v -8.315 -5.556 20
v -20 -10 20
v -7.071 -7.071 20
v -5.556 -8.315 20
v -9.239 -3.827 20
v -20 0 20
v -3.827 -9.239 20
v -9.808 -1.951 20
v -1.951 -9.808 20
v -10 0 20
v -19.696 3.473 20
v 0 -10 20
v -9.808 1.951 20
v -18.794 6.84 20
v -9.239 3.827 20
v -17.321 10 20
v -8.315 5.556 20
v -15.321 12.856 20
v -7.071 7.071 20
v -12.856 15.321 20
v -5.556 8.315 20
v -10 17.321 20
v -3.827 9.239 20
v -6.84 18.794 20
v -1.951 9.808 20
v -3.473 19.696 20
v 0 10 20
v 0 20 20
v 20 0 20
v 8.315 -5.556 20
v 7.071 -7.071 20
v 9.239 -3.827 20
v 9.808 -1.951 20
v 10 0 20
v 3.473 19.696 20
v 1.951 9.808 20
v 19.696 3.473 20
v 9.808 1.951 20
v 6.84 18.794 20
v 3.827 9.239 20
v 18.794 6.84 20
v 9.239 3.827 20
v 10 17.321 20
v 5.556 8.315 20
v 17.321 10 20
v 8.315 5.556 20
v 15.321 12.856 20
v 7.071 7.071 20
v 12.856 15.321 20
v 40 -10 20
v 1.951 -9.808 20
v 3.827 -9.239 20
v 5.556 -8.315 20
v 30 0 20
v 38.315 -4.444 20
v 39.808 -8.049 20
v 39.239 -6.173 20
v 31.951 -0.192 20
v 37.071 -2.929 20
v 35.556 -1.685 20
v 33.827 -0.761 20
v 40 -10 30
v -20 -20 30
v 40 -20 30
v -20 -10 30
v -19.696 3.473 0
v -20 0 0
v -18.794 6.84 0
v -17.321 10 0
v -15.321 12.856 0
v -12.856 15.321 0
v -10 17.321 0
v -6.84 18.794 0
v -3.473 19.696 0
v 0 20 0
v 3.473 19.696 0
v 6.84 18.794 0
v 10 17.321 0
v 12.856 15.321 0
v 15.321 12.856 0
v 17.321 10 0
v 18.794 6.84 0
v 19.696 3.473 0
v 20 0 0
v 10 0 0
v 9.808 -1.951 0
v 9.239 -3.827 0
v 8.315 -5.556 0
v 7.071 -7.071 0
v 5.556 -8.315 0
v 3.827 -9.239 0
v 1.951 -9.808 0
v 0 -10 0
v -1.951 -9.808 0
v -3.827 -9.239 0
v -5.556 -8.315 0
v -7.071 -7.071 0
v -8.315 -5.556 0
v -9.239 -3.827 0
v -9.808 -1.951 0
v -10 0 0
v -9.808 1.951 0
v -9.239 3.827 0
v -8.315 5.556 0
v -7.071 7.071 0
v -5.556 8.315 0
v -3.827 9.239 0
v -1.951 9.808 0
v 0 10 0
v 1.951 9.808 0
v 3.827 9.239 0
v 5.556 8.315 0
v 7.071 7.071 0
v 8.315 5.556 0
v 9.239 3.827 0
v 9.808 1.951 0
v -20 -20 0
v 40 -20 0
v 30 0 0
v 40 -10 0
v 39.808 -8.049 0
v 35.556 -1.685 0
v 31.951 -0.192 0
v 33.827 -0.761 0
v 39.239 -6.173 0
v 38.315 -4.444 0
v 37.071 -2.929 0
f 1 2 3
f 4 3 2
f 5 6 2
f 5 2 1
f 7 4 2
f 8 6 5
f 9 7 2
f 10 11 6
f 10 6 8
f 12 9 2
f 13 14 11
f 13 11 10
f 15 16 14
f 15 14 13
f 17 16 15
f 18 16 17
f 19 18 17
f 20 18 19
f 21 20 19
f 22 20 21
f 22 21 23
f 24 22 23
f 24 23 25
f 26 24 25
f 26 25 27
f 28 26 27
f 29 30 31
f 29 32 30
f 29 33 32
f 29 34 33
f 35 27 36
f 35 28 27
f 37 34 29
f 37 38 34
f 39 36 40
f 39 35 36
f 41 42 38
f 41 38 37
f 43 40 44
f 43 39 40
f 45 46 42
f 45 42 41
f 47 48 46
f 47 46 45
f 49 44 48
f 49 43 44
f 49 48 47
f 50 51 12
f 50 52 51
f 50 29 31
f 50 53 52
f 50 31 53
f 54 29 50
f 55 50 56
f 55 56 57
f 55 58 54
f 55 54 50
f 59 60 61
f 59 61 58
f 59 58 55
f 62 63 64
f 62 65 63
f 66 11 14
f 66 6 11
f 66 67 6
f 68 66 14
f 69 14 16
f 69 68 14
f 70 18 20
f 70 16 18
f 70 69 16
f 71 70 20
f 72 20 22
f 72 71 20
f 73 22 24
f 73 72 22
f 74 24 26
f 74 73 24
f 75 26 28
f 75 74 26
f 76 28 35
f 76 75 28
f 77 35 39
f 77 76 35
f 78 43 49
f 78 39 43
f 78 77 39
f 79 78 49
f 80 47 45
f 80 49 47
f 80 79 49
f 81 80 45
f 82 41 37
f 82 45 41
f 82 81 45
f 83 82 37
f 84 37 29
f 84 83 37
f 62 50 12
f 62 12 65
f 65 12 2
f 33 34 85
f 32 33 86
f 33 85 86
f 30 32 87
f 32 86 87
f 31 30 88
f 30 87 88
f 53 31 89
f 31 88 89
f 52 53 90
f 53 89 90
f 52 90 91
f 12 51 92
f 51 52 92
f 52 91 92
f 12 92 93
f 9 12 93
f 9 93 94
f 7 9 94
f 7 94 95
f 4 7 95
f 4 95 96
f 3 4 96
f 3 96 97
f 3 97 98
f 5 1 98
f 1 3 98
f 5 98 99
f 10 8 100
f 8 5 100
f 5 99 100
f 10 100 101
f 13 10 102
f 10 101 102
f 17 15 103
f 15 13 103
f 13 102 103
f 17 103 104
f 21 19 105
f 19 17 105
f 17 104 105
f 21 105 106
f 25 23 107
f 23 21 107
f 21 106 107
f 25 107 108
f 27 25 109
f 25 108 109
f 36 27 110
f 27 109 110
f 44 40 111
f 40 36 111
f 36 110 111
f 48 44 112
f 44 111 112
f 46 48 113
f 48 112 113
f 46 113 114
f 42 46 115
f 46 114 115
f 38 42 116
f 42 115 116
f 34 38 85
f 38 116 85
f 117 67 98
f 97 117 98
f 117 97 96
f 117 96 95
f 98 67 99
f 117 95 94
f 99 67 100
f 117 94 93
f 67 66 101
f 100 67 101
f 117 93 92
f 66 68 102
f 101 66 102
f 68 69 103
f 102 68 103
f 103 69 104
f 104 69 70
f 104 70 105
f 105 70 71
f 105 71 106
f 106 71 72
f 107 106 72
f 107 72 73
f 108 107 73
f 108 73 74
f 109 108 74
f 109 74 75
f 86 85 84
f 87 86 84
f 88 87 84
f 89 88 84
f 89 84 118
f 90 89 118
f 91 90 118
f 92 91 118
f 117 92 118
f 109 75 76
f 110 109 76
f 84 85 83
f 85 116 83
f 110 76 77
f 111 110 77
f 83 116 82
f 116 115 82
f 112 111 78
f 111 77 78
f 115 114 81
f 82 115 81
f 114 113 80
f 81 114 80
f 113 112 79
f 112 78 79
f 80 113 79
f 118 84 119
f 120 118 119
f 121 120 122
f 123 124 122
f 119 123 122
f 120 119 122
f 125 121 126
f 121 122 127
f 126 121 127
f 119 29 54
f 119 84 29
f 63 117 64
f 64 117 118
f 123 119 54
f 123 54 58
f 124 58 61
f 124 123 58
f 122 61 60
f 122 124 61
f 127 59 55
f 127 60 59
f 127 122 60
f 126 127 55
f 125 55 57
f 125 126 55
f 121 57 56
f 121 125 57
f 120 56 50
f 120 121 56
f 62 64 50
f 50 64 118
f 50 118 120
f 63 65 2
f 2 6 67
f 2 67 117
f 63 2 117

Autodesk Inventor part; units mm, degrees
ref_plane "YZ Plane" through (0, 0, 0) normal (1, 0, 0) x (0, 1, 0)
ref_plane "XZ Plane" through (0, 0, 0) normal (0, 1, 0) x (-1, 0, 0)
ref_plane "XY Plane" through (0, 0, 0) normal (0, 0, 1) x (1, 0, 0)
sketch "草圖1" plane through (0, 0, 0) normal (0, 0, 1) x (1, 0, 0)
  circle A0 centre (0, 0) radius 10
  arc A1 (20, 0) -> (-20, 0) centre (0, 0) ccw
  line L0 (-20, 0) -> (-20, -20)
  line L1 (-20, -20) -> (40, -20)
  line L2 (40, -20) -> (40, -10)
  line L3 (40, -10) -> (-20, -10)
  line L4 (-20, -10) -> (-20, -20)
  line L5 (20, 0) -> (30, 0)
  line L6 (40, -10) -> (40, -10)
  arc A2 (40, -10) -> (30, 0) centre (30, -10) ccw
  point P0 (40, 0)
  point P1 (0, -10)
extrude "擠出1" add sketch "草圖1" along normal blind 30 contours L3 L2 L1 L0
extrude "擠出2" add sketch "草圖1" along normal blind 20 contours L3 L0 A1 L5 A2
